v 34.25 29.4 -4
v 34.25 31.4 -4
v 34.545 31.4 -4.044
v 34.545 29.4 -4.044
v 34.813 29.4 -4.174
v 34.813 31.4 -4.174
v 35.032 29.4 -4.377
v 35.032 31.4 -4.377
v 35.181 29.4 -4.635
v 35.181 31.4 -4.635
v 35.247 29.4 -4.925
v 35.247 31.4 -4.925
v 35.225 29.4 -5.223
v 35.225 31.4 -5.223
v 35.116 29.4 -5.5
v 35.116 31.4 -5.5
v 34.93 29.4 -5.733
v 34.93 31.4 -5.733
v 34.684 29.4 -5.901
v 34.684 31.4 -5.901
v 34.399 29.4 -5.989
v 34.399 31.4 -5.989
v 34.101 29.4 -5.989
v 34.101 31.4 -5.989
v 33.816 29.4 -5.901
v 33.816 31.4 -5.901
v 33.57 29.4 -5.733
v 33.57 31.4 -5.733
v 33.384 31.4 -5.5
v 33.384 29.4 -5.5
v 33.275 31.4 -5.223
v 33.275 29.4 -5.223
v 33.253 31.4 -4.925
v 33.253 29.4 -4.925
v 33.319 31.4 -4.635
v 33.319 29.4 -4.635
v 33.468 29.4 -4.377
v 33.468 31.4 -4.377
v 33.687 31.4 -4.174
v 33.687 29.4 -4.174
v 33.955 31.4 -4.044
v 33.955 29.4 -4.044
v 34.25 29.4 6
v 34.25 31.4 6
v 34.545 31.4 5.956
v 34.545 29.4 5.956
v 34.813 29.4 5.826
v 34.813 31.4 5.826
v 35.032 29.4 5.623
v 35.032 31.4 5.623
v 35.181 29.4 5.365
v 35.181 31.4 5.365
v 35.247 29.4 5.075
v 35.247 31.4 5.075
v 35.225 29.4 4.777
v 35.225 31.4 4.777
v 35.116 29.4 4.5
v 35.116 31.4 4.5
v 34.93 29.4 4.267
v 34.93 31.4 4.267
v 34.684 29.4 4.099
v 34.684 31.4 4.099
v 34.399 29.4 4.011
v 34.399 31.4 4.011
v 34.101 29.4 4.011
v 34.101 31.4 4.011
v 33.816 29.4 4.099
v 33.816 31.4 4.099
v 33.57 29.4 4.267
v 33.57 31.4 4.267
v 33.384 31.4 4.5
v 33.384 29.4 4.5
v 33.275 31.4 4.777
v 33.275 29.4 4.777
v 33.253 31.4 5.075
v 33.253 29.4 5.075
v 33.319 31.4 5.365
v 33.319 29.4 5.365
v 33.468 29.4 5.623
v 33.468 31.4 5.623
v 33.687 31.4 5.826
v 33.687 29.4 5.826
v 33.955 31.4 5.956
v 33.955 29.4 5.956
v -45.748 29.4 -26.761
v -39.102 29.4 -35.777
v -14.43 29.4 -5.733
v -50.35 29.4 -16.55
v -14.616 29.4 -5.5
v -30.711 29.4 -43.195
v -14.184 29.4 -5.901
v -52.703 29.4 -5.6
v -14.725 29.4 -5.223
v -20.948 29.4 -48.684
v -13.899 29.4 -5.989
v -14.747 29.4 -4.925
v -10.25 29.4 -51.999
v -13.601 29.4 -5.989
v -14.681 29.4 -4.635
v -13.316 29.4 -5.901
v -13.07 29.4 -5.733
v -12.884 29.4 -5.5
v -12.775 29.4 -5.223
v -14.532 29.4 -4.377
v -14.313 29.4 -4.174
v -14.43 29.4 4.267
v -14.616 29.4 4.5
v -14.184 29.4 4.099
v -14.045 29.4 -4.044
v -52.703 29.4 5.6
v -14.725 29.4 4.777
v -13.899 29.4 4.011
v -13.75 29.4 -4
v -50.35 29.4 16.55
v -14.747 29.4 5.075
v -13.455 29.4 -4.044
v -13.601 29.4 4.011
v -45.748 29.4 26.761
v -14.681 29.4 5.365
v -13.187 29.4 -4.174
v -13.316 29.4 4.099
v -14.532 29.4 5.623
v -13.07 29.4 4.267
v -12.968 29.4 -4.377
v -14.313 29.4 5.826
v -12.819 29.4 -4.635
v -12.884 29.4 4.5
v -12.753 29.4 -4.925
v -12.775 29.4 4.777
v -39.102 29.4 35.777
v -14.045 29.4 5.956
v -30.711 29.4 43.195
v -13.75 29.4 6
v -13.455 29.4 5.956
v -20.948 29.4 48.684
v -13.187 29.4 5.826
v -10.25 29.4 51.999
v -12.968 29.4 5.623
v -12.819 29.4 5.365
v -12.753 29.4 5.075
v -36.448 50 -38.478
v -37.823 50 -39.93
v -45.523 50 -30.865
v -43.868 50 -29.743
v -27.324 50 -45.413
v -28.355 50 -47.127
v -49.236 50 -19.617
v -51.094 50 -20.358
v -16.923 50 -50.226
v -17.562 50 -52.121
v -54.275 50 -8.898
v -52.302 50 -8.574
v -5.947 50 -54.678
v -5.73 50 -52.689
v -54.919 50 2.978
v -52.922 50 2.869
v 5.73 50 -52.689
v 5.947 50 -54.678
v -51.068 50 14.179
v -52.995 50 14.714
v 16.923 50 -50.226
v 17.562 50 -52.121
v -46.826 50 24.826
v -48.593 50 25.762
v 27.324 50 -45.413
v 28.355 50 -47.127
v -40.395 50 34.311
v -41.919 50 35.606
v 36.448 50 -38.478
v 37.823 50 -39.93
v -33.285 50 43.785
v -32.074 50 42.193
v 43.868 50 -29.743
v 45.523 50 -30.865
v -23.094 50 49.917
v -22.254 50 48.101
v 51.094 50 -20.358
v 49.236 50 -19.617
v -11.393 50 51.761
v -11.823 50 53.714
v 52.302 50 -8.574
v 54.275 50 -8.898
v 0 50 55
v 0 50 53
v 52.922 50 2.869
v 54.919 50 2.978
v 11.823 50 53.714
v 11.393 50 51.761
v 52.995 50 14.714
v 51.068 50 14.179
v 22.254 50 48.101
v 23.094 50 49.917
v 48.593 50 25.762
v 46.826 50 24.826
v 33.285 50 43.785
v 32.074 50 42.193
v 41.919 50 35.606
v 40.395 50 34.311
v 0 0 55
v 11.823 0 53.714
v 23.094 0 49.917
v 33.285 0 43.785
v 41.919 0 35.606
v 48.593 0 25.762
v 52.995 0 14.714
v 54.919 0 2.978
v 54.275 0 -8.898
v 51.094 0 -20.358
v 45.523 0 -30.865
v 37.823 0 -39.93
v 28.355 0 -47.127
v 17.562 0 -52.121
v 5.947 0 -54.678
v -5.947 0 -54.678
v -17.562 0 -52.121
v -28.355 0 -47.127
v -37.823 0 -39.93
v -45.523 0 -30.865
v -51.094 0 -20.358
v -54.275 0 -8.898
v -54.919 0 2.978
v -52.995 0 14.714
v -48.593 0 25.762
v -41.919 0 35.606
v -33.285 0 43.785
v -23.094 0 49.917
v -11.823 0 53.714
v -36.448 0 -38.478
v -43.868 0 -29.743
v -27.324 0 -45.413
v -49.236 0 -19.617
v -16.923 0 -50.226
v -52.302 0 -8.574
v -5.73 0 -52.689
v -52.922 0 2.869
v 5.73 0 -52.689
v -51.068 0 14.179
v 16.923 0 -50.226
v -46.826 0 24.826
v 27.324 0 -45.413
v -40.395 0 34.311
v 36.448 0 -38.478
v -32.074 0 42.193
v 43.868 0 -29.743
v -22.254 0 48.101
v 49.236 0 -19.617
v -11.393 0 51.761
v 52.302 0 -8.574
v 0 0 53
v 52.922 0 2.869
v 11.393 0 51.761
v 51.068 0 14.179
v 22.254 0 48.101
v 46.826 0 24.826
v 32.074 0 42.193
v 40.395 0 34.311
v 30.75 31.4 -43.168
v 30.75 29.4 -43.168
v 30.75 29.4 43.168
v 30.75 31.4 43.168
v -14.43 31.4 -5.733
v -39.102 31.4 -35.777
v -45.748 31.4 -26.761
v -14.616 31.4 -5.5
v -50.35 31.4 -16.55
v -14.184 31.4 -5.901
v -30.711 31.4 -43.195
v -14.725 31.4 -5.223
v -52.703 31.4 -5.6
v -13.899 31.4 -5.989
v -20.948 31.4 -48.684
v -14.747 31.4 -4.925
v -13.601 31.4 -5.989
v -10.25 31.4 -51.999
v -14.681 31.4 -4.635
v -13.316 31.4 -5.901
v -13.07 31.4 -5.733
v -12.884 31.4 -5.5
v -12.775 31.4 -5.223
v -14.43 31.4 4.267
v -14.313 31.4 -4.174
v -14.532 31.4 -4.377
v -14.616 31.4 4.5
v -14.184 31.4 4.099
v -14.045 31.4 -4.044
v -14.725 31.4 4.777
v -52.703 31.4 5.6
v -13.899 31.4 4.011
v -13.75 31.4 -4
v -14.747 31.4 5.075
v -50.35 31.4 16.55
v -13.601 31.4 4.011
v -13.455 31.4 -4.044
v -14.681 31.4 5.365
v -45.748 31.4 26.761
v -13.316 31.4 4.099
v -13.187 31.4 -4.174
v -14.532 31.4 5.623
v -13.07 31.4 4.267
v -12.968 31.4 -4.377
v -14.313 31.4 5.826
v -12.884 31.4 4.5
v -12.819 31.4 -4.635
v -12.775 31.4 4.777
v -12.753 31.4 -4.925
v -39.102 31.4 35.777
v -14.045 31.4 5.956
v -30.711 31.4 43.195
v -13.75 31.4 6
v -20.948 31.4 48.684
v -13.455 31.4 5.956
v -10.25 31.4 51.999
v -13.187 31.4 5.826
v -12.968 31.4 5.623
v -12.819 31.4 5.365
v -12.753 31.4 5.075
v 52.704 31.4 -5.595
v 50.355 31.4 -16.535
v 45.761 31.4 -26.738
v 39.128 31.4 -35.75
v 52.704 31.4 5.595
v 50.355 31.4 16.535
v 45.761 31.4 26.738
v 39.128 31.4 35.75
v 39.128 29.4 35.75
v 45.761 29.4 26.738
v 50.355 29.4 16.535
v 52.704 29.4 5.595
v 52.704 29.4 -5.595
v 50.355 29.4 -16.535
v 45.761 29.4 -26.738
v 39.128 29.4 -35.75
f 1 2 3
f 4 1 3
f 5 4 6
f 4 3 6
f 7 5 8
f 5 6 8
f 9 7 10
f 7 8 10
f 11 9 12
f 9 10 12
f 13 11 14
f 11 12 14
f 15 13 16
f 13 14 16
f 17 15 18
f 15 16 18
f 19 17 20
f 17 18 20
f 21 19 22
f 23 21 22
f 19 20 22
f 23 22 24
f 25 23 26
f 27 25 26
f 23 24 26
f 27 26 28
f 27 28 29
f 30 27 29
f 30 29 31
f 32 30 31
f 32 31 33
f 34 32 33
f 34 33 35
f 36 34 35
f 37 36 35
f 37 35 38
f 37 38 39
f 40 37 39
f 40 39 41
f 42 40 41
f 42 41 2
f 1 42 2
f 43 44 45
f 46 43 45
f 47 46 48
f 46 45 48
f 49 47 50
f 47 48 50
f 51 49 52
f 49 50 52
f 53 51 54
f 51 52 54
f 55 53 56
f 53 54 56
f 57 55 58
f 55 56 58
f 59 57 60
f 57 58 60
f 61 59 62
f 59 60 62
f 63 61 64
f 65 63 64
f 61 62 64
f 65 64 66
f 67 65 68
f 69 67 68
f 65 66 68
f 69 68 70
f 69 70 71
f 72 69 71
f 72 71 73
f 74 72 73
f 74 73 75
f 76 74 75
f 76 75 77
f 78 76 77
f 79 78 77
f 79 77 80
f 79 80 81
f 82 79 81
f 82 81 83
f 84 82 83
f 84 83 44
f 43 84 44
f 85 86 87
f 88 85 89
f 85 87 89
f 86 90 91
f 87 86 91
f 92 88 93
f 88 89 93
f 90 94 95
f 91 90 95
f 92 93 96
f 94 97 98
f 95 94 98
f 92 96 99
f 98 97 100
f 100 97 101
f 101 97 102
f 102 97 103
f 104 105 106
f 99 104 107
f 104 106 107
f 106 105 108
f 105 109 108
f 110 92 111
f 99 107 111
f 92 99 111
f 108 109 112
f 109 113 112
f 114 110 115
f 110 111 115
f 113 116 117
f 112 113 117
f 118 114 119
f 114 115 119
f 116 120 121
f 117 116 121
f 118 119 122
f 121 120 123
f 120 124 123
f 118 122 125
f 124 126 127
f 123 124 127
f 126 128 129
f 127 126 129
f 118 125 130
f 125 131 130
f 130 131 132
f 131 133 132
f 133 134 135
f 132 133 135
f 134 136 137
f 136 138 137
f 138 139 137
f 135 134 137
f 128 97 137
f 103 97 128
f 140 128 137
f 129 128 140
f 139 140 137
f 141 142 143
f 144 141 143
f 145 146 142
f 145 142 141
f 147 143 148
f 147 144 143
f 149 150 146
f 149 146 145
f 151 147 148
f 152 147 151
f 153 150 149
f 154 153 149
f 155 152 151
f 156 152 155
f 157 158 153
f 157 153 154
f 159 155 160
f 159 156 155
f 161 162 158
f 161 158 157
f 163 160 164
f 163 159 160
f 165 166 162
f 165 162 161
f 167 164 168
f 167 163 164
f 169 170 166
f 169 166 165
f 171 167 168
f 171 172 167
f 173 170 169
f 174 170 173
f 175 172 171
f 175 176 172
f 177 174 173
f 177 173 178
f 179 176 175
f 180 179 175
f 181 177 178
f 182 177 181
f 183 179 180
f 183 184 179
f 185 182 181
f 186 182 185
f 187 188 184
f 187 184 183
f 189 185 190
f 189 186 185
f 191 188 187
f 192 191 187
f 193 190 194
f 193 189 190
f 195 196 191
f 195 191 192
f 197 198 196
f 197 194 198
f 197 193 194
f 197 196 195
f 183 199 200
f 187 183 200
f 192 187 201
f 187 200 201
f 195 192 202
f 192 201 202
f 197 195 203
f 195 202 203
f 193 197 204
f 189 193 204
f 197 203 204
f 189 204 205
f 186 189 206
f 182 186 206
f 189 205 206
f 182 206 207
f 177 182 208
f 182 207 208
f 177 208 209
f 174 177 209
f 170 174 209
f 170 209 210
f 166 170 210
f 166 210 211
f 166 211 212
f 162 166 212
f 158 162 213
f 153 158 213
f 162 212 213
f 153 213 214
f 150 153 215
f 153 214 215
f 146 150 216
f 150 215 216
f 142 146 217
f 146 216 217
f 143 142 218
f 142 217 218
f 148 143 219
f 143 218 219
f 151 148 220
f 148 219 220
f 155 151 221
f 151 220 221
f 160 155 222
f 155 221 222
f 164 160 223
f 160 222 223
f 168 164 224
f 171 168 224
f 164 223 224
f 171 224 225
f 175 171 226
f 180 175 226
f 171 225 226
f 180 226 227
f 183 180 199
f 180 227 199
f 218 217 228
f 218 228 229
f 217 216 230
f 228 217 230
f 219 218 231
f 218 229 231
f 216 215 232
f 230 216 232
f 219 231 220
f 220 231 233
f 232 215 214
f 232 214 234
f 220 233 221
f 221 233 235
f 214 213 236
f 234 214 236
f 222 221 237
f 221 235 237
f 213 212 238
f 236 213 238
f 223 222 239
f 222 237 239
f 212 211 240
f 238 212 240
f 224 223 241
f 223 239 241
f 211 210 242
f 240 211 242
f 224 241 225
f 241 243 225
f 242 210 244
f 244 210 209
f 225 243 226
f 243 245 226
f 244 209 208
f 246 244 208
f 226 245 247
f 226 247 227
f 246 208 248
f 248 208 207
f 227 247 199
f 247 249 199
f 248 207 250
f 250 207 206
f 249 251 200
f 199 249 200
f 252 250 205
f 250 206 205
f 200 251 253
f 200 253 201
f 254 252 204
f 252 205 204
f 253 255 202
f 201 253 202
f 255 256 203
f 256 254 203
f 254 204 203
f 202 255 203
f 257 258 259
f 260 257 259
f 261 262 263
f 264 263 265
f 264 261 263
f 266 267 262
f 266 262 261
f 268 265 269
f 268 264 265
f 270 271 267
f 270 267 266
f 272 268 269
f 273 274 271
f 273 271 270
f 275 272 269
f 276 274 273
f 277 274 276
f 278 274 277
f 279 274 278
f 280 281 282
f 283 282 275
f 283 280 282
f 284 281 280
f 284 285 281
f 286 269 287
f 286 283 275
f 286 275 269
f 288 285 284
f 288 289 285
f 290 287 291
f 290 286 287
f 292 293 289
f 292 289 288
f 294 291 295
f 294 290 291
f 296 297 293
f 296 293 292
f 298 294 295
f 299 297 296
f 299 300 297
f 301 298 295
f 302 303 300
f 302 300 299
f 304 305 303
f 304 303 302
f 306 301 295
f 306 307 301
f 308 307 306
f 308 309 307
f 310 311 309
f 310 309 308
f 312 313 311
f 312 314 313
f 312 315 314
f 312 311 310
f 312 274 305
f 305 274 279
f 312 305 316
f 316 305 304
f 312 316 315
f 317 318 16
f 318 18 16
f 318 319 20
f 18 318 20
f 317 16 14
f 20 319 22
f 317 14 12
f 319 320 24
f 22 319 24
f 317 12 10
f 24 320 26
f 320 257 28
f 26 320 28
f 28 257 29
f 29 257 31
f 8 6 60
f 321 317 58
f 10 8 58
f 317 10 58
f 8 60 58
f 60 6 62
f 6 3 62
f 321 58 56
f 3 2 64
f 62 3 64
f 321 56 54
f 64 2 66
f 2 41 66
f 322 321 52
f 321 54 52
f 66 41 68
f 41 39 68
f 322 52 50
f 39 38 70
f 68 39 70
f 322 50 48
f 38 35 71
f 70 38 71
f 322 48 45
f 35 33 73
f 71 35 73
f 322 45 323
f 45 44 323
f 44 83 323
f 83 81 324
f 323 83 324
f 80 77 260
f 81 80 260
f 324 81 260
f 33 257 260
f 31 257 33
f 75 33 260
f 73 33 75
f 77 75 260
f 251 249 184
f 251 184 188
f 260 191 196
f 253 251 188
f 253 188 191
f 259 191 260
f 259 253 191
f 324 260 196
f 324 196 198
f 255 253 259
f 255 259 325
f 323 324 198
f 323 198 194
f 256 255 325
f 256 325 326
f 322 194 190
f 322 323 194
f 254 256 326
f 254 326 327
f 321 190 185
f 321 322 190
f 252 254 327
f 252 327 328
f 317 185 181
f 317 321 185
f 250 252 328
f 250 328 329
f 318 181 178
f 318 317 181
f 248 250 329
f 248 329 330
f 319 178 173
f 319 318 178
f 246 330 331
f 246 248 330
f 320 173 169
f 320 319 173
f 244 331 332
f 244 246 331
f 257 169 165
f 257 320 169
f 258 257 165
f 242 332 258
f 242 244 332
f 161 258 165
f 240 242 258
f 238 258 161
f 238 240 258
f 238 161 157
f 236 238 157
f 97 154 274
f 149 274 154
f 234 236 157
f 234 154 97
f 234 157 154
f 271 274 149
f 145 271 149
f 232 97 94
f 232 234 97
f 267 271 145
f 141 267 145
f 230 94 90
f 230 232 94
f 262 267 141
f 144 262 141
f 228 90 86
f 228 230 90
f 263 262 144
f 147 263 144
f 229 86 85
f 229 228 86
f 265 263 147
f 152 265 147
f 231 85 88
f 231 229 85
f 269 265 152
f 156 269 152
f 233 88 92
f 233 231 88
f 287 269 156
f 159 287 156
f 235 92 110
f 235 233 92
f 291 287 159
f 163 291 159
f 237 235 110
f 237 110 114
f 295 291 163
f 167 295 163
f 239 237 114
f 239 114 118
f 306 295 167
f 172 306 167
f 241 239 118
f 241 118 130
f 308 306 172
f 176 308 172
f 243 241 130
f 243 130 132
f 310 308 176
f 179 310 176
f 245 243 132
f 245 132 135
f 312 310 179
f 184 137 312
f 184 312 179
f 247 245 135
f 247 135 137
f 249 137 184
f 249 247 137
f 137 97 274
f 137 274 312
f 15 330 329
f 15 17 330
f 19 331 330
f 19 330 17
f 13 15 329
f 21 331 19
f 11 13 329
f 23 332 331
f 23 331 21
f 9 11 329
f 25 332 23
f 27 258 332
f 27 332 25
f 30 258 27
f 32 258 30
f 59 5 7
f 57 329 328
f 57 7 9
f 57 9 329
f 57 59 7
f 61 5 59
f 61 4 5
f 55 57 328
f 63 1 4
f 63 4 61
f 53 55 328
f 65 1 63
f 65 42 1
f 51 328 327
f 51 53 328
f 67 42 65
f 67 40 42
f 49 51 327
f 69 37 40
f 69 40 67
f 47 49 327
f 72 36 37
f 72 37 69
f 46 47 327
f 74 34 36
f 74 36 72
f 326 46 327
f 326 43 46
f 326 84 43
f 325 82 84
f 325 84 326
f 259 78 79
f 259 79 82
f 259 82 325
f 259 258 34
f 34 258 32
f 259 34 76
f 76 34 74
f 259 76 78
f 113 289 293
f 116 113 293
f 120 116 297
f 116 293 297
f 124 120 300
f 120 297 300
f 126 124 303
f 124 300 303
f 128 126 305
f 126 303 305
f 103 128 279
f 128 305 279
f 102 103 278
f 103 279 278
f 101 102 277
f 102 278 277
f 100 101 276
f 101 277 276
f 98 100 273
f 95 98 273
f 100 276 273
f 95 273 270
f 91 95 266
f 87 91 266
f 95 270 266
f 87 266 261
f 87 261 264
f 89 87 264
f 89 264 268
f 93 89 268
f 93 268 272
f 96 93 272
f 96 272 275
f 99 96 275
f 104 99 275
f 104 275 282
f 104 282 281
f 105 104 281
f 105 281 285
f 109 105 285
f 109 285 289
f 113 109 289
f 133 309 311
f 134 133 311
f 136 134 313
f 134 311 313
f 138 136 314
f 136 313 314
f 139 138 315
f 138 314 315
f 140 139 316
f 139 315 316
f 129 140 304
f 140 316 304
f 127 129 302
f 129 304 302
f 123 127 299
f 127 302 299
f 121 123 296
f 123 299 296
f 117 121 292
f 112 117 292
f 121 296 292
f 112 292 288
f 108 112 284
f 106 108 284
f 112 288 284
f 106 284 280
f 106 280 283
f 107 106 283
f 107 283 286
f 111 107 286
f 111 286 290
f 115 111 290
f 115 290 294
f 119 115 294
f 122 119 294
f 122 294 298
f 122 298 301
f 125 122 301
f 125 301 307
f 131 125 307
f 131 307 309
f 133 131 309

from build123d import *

# Parameters (mm, degrees)
SKETCH1_R           = 55
SKETCH1_R_2         = 53
BOSS_EXTRUDE1_DEPTH = 50
RIB7_REACH          = 85.881
SKETCH2_WALL_W      = 256.096361878
SKETCH2_WALL_H      = 2
RIB8_REACH          = 85.881
SKETCH5_WALL_W      = 103.99879807
SKETCH5_WALL_H      = 2
SKETCH6_R           = 1
CUT_EXTRUDE1_DEPTH  = 84.880629468


with BuildPart() as part:
    # Sketch1 → Boss-Extrude1 (new body)
    with BuildSketch(Plane(origin=(0, 0, 0), x_dir=(1, 0, 0), z_dir=(0, 1, 0))):
        with Locations(Location((0, 0, 0), (0, 0, 270))):
            Circle(SKETCH1_R)
        with Locations(Location((0, 0, 0), (0, 0, 270))):
            Circle(SKETCH1_R_2, mode=Mode.SUBTRACT)
    extrude(amount=BOSS_EXTRUDE1_DEPTH)

    # Sketch2 wall → Rib7 (add, up to next)
    with BuildSketch(Plane(origin=(30.75, 31.4, 0), x_dir=(0, 0, 1), z_dir=(1, 0, 0)), mode=Mode.PRIVATE) as rib7_sk1:
        with Locations((0, 1)):
            Rectangle(SKETCH2_WALL_W, SKETCH2_WALL_H)
    rib7_tool1 = extrude(rib7_sk1.sketch, amount=RIB7_REACH, mode=Mode.PRIVATE) - part.part
    add(rib7_tool1.solids().sort_by_distance((30.75, 31.4, 0))[0])

    # Sketch5 wall → Rib8 (add, up to next)
    with BuildSketch(Plane(origin=(-10.25, 31.4, 0), x_dir=(0, 0, 1), z_dir=(1, 0, 0)), mode=Mode.PRIVATE) as rib8_sk1:
        with Locations((0, 1)):
            Rectangle(SKETCH5_WALL_W, SKETCH5_WALL_H)
    rib8_tool1 = extrude(rib8_sk1.sketch, amount=-RIB8_REACH, mode=Mode.PRIVATE) - part.part
    add(rib8_tool1.solids().sort_by_distance((-10.25, 31.4, 0))[0])

    # Sketch6 → Cut-Extrude1 (cut, through all)
    with BuildSketch(Plane(origin=(0, 31.4, 0), x_dir=(1, 0, 0), z_dir=(0, 1, 0))):
        with Locations(Location((-13.75, -5, 0), (0, 0, 270))):
            Circle(SKETCH6_R)
        with Locations(Location((34.25, -5, 0), (0, 0, 270))):
            Circle(SKETCH6_R)
        with Locations(Location((34.25, 5, 0), (0, 0, 270))):
            Circle(SKETCH6_R)
        with Locations(Location((-13.75, 5, 0), (0, 0, 270))):
            Circle(SKETCH6_R)
    extrude(amount=-CUT_EXTRUDE1_DEPTH, mode=Mode.SUBTRACT)


solid = part.part
